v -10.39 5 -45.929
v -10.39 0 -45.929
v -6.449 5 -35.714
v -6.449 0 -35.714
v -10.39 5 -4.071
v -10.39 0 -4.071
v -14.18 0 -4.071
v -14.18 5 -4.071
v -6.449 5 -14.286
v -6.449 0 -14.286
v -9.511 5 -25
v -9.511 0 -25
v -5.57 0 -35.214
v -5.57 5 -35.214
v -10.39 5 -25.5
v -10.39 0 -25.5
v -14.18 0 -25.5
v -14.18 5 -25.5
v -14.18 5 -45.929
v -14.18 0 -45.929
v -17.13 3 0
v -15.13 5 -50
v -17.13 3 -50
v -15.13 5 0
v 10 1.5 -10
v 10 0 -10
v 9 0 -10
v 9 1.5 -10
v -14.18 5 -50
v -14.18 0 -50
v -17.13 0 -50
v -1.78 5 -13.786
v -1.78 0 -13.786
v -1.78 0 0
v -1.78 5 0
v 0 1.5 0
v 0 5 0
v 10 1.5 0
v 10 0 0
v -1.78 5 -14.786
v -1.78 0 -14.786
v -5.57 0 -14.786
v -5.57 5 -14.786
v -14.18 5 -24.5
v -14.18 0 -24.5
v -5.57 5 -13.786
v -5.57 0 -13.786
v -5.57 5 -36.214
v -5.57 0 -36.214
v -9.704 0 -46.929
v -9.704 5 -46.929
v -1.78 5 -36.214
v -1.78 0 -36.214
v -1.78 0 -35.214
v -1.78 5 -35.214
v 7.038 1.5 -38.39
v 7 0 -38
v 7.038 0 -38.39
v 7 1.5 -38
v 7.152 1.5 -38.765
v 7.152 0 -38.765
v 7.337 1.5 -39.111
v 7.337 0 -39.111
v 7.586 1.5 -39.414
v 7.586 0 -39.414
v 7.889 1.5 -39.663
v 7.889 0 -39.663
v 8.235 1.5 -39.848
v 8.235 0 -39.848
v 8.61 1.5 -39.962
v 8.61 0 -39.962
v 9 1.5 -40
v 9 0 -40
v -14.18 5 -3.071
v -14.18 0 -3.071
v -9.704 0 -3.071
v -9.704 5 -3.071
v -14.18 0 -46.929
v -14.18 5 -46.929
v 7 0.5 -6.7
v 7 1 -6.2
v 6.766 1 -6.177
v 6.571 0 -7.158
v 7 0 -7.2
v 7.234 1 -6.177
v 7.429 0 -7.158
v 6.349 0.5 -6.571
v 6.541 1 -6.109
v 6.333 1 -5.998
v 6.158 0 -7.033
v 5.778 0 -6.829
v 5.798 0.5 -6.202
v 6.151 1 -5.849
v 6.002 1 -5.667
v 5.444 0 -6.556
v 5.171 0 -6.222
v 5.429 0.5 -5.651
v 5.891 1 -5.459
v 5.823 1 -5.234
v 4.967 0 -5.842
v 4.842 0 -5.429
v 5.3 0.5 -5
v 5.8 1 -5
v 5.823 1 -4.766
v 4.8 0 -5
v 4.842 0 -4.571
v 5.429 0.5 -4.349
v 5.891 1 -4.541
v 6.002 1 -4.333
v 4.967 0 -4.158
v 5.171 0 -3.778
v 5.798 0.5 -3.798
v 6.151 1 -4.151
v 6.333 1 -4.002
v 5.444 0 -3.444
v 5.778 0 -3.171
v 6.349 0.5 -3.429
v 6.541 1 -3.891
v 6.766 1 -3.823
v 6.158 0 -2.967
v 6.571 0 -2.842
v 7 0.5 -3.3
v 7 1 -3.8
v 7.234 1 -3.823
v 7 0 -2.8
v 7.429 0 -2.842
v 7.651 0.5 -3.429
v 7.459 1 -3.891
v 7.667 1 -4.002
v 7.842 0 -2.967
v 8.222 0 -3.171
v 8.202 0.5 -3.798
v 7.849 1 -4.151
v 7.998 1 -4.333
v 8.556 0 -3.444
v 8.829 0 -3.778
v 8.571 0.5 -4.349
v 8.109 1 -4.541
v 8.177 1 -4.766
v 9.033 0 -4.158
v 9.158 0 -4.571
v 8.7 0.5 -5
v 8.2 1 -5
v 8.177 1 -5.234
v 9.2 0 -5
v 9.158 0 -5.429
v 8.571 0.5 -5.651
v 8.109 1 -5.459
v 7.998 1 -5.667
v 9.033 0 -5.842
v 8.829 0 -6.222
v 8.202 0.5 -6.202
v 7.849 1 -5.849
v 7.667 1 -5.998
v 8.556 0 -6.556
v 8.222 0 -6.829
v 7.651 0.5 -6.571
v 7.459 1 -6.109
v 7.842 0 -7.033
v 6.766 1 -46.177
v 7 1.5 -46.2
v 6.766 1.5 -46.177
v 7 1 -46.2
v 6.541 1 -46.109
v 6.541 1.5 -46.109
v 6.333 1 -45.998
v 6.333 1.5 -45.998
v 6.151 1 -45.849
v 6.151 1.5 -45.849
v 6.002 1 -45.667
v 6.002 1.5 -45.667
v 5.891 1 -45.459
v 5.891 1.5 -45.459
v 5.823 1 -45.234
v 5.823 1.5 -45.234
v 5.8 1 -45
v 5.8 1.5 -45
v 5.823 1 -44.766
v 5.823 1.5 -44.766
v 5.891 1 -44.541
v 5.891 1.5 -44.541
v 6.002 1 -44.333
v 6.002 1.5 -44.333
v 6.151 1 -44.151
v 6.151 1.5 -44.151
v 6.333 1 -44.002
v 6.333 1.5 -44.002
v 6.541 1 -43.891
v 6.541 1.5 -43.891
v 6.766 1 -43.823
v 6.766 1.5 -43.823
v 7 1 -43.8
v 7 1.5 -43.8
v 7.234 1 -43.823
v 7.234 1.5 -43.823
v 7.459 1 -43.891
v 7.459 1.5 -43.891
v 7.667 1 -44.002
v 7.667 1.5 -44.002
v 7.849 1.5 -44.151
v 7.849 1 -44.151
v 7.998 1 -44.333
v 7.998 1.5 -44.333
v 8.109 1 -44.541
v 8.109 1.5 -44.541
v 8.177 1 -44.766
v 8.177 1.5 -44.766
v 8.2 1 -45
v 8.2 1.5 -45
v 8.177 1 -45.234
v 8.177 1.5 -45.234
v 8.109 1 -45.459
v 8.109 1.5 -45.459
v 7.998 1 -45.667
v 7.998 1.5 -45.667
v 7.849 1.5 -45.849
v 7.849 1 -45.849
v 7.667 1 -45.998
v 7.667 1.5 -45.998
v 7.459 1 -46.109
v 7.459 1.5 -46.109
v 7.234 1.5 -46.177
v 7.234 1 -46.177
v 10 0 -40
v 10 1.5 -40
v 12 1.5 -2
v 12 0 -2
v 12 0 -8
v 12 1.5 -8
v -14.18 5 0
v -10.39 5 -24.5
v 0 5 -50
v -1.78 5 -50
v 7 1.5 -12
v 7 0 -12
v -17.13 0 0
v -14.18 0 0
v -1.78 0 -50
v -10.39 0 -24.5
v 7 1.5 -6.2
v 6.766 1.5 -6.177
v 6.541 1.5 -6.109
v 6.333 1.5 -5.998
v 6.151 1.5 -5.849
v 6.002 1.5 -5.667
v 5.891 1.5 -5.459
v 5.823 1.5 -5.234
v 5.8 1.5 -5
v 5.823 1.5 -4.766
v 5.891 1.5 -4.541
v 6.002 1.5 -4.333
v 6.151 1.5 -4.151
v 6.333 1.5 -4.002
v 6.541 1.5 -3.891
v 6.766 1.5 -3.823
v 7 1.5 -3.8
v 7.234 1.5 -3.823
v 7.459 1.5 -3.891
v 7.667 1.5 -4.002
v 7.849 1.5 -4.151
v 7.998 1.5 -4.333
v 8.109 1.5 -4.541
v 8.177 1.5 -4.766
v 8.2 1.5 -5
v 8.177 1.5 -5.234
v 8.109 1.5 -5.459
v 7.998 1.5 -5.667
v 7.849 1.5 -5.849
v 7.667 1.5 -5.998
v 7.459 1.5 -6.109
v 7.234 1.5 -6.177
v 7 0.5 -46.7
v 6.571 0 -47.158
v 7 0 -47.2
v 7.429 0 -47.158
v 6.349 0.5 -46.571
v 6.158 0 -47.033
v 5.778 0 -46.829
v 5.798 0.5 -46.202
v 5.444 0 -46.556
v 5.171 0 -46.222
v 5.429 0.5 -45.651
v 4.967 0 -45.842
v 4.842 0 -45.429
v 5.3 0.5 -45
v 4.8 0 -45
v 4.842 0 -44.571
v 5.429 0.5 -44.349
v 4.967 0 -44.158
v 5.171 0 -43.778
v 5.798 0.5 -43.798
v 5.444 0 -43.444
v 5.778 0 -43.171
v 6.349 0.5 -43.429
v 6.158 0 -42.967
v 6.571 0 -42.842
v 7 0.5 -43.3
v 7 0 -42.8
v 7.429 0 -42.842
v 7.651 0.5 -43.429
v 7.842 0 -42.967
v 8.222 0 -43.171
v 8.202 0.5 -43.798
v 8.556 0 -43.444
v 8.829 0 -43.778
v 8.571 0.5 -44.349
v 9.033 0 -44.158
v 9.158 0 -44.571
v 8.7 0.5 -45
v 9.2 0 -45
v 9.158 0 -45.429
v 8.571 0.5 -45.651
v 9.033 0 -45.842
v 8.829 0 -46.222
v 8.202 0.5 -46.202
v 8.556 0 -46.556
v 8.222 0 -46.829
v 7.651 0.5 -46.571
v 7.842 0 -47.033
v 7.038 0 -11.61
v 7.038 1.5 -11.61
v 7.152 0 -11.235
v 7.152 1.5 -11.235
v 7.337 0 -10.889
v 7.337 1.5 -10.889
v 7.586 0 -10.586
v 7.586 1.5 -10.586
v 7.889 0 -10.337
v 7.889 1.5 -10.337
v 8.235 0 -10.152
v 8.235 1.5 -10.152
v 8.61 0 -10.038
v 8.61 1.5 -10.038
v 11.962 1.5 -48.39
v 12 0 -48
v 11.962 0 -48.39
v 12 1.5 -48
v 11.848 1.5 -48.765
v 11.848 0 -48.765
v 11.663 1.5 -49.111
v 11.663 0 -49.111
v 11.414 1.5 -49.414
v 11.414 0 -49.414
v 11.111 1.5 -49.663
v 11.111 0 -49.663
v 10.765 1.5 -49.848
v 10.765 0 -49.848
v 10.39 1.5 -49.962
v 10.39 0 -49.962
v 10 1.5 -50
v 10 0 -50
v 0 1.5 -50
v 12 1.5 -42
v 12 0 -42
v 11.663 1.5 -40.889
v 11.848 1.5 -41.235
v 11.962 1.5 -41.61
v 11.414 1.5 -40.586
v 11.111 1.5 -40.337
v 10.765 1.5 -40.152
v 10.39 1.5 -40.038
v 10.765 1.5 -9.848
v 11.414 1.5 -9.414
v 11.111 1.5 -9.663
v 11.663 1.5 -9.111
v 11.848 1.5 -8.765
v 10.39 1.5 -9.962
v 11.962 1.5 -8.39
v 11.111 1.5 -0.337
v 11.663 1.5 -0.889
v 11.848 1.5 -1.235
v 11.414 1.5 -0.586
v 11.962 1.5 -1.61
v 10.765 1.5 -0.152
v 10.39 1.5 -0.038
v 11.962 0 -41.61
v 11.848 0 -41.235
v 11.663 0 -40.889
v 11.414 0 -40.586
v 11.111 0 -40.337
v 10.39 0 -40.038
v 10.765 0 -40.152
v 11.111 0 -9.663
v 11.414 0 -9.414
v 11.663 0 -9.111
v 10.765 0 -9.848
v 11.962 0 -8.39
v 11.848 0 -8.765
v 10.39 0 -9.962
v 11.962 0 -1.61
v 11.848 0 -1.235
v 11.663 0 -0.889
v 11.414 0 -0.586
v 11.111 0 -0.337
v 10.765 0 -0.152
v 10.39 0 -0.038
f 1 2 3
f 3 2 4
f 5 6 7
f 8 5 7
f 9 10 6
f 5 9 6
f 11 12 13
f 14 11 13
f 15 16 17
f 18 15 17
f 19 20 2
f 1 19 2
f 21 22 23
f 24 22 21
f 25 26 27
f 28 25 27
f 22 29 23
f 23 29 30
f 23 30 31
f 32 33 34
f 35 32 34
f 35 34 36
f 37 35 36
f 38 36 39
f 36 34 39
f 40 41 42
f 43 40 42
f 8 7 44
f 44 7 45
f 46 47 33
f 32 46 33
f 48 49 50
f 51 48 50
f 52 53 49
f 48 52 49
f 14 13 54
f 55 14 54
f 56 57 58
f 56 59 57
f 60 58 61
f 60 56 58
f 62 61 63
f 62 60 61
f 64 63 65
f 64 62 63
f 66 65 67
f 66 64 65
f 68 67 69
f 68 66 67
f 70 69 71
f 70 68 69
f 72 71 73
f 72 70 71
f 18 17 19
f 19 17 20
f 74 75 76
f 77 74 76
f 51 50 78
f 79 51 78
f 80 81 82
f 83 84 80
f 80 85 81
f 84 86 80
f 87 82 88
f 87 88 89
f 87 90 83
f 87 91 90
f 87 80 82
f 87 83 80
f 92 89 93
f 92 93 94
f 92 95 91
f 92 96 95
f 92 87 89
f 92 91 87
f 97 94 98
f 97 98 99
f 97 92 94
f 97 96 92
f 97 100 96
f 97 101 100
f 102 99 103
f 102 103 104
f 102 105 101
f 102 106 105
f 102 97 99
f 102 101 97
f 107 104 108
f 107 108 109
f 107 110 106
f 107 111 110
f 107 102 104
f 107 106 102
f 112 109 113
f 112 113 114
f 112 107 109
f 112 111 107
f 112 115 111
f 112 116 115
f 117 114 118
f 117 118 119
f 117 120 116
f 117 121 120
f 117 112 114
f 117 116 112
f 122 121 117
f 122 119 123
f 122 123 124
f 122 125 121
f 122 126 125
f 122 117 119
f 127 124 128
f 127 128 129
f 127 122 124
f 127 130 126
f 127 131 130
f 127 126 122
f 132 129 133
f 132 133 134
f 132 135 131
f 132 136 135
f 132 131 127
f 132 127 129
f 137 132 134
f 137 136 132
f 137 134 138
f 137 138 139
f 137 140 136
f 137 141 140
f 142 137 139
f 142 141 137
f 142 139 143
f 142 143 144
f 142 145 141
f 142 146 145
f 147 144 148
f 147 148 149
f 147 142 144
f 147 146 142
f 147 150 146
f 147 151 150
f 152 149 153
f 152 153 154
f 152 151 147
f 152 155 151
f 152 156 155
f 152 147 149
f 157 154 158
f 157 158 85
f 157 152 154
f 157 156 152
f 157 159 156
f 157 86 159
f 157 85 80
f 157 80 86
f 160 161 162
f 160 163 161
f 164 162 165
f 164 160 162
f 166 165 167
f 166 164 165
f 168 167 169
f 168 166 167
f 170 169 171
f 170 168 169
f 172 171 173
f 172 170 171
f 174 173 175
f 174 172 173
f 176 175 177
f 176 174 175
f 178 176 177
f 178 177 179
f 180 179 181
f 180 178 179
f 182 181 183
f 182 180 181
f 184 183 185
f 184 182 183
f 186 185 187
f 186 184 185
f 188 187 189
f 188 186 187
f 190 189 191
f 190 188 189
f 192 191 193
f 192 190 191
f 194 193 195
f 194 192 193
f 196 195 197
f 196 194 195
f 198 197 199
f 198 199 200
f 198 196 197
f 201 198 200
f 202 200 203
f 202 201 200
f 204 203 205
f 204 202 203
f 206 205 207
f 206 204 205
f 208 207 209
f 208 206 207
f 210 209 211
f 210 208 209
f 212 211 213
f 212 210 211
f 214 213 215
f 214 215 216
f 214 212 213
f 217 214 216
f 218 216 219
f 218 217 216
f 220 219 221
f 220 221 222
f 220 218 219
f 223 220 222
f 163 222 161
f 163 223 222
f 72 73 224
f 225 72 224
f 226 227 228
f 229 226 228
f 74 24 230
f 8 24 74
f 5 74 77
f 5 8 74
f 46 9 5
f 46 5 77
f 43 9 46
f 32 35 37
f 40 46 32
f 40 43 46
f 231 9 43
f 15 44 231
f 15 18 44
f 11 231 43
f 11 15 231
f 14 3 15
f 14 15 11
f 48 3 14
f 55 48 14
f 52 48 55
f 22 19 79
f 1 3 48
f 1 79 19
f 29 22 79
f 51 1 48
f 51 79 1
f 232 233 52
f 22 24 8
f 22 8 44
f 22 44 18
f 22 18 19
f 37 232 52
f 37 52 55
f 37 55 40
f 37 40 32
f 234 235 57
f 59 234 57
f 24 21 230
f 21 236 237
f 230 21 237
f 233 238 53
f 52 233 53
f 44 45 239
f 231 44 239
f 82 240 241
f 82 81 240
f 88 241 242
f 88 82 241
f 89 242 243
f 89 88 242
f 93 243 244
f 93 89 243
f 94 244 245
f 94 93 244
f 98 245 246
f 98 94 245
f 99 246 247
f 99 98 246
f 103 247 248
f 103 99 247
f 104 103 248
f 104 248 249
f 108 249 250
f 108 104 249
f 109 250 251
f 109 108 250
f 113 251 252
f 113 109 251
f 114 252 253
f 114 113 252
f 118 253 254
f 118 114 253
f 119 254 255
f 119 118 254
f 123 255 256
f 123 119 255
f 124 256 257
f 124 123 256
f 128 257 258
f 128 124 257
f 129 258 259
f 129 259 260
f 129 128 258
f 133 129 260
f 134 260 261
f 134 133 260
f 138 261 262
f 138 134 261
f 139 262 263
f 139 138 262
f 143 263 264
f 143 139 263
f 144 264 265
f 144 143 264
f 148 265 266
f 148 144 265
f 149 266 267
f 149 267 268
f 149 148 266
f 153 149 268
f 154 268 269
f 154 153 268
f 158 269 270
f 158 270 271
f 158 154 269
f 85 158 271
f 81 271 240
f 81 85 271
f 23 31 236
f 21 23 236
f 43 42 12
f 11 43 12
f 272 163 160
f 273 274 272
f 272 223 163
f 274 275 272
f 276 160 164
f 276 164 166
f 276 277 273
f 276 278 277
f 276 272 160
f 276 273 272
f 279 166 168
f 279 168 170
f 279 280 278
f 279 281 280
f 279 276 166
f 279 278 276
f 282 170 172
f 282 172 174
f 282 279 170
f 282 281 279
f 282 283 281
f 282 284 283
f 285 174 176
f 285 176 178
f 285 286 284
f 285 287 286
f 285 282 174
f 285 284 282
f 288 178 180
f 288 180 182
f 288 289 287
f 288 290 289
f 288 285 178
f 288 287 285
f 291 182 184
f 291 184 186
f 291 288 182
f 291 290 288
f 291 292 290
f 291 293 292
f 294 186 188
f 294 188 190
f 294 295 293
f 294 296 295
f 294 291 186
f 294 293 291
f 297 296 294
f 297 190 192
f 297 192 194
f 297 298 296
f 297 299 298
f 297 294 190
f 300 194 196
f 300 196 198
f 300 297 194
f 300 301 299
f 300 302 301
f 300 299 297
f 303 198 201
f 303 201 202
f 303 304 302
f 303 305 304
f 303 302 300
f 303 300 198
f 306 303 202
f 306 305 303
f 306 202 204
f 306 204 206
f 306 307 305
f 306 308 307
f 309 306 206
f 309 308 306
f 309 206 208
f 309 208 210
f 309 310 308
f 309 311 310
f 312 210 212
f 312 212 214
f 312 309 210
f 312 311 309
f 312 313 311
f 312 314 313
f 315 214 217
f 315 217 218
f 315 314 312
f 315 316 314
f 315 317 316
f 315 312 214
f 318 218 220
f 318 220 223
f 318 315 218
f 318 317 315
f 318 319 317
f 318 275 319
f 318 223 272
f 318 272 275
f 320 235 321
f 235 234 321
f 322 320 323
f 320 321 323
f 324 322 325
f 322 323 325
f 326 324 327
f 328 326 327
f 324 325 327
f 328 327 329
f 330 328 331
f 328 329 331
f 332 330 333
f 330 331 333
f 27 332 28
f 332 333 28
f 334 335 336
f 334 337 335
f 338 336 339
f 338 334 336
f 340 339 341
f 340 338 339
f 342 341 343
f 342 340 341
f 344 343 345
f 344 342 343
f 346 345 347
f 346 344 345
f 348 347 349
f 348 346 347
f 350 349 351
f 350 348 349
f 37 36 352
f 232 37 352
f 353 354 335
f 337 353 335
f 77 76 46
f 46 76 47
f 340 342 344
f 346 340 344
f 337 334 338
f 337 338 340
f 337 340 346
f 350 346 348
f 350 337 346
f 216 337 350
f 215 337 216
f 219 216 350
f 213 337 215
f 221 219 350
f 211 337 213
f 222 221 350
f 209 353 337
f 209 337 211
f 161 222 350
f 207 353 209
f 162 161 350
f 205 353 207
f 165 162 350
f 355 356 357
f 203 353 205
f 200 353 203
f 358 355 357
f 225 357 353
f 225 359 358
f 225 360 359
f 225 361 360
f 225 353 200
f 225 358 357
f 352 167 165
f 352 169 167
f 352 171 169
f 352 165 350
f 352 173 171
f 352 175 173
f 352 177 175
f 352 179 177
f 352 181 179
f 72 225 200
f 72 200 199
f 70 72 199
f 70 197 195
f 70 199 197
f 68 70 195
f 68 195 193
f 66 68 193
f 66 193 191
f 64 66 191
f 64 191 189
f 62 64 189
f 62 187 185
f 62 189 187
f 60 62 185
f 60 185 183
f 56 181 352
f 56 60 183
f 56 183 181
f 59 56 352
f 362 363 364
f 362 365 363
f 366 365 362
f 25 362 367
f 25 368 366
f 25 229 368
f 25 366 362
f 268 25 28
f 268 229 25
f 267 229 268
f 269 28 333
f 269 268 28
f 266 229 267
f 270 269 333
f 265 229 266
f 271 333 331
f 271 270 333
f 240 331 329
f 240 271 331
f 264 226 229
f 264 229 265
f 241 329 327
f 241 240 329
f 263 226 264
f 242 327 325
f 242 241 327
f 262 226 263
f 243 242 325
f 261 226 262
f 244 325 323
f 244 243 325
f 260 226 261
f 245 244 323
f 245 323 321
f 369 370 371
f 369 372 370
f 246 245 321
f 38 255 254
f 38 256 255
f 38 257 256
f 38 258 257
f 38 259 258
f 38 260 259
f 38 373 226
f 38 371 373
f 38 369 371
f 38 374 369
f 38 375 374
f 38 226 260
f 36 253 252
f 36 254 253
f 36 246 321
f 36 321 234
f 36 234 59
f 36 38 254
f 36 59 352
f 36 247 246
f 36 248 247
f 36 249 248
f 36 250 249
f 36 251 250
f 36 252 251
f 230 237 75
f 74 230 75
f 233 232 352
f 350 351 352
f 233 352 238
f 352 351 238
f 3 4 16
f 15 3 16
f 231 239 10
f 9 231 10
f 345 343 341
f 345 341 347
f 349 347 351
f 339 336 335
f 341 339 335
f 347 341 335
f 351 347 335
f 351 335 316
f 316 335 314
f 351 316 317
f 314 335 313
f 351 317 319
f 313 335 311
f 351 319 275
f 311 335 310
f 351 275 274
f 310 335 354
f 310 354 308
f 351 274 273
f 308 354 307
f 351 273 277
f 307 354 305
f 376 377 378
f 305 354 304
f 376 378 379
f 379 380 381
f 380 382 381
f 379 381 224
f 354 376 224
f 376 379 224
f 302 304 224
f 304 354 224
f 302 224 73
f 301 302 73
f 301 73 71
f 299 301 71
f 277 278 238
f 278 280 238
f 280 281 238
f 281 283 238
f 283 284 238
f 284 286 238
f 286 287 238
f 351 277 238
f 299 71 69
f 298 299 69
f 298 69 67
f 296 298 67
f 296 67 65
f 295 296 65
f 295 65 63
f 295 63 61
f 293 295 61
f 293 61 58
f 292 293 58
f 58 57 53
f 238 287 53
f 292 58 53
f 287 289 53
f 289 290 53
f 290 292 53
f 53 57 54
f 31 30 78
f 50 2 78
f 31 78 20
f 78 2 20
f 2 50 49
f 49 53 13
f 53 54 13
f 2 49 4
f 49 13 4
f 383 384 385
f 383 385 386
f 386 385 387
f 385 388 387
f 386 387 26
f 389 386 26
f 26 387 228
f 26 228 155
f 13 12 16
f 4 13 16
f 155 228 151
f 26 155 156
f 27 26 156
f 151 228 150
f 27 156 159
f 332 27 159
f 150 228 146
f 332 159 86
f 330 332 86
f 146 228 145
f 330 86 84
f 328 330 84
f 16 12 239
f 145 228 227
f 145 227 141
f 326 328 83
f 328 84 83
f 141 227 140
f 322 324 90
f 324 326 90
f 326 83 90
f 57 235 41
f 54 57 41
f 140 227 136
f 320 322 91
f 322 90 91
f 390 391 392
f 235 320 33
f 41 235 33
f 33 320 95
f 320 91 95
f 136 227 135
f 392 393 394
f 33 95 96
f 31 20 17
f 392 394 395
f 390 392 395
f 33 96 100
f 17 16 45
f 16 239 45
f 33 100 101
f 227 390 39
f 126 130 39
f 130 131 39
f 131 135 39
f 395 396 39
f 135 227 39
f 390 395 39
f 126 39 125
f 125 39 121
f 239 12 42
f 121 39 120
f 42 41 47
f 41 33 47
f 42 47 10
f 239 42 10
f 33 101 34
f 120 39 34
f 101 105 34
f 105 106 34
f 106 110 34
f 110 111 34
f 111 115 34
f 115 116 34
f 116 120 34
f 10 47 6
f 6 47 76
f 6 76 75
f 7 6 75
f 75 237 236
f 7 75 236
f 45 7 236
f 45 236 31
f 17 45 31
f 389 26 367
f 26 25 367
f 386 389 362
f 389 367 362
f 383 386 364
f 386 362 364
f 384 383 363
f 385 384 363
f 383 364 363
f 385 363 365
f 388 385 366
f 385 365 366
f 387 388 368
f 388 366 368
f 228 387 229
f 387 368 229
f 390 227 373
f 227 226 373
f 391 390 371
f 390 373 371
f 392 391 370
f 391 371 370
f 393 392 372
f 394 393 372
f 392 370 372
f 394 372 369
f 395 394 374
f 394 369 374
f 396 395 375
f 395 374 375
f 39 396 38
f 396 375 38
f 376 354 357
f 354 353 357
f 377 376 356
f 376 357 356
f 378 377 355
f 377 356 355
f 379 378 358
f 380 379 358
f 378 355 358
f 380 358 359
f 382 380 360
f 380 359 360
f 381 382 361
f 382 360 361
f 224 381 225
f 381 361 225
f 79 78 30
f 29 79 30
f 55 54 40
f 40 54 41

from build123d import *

# Parameters (mm, degrees)
BOSS_EXTRUDE1_DEPTH                            = 5
BOSS_EXTRUDE3_DEPTH                            = 1.5
FILLET1_R                                      = 2
CSK_FOR_M2_FLAT_HEAD_MACHINE_SCREW1_AT_2_COUNT = 2
CSK_FOR_M2_FLAT_HEAD_MACHINE_SCREW1_AT_2_PITCH = 40
CHAMFER1_SIZE                                  = 2


with BuildPart() as part:
    # Sketch1 → Boss-Extrude1 (new body)
    with BuildSketch(Plane(origin=(0, 0, 0), x_dir=(1, 0, 0), z_dir=(0, 1, 0))):
        Polygon((-14.18, 46.928571429), (-14.18, 50), (-17.13, 50), (-17.13, 0), (-14.18, 0), (-14.18, 3.071428571), (-9.703639402, 3.071428571), (-5.570306069, 13.785714286), (-1.78, 13.785714286), (-1.78, 0), (0, 0), (0, 50), (-1.78, 50), (-1.78, 36.214285714), (-5.570306069, 36.214285714), (-9.703639402, 46.928571429), align=None)
        Polygon((-14.18, 4.071428571), (-14.18, 24.5), (-10.389693931, 24.5), (-6.449249487, 14.285714286), (-10.389693931, 4.071428571), align=None, mode=Mode.SUBTRACT)
        Polygon((-10.389693931, 45.928571429), (-6.449249487, 35.714285714), (-10.389693931, 25.5), (-14.18, 25.5), (-14.18, 45.928571429), align=None, mode=Mode.SUBTRACT)
        Polygon((-5.570306069, 14.785714286), (-9.510750513, 25), (-5.570306069, 35.214285714), (-1.78, 35.214285714), (-1.78, 14.785714286), align=None, mode=Mode.SUBTRACT)
    extrude(amount=BOSS_EXTRUDE1_DEPTH)

    # Sketch5 → Boss-Extrude3 (add)
    with BuildSketch(Plane.XZ):
        Polygon((12, -40), (12, -50), (0, -50), (0, 0), (12, 0), (12, -10), (7, -10), (7, -40), align=None)
    extrude(amount=-BOSS_EXTRUDE3_DEPTH)

    # Fillet1
    fillet1_edges = [part.edges().sort_by_distance(p)[0] for p in [
        (12, 0.75, -40),
        (12, 0.75, -50),
        (12, 0.75, 0),
        (12, 0.75, -10),
        (7, 0.75, -10),
        (7, 0.75, -40),
    ]]
    fillet(fillet1_edges, radius=FILLET1_R)

    # Sketch6 → CSK for M2 Flat Head Machine Screw1 (revolve, cut)
    with BuildSketch(Plane(origin=(7, 0, -5), x_dir=(0, 0, -1), z_dir=(1, 0, 0))):
        Polygon((0, 0), (0, 1.5), (1.2, 1.5), (1.2, 1), (2.2, 0), align=None)
    csk_for_m2_flat_head_machine_screw1 = revolve(axis=Axis((7, -6.35, -5), (0, 1, 0)), mode=Mode.SUBTRACT)

    # CSK for M2 Flat Head Machine Screw1 at 2: CSK for M2 Flat Head Machine Screw1 ×2
    with Locations(*[(0, 0, -i * CSK_FOR_M2_FLAT_HEAD_MACHINE_SCREW1_AT_2_PITCH) for i in range(1, CSK_FOR_M2_FLAT_HEAD_MACHINE_SCREW1_AT_2_COUNT)]):
        add(csk_for_m2_flat_head_machine_screw1, mode=Mode.SUBTRACT)

    # Chamfer1
    chamfer1_edges = [part.edges().sort_by_distance(p)[0] for p in [
        (-17.13, 5, -25),
    ]]
    chamfer(chamfer1_edges, length=CHAMFER1_SIZE)


solid = part.part
